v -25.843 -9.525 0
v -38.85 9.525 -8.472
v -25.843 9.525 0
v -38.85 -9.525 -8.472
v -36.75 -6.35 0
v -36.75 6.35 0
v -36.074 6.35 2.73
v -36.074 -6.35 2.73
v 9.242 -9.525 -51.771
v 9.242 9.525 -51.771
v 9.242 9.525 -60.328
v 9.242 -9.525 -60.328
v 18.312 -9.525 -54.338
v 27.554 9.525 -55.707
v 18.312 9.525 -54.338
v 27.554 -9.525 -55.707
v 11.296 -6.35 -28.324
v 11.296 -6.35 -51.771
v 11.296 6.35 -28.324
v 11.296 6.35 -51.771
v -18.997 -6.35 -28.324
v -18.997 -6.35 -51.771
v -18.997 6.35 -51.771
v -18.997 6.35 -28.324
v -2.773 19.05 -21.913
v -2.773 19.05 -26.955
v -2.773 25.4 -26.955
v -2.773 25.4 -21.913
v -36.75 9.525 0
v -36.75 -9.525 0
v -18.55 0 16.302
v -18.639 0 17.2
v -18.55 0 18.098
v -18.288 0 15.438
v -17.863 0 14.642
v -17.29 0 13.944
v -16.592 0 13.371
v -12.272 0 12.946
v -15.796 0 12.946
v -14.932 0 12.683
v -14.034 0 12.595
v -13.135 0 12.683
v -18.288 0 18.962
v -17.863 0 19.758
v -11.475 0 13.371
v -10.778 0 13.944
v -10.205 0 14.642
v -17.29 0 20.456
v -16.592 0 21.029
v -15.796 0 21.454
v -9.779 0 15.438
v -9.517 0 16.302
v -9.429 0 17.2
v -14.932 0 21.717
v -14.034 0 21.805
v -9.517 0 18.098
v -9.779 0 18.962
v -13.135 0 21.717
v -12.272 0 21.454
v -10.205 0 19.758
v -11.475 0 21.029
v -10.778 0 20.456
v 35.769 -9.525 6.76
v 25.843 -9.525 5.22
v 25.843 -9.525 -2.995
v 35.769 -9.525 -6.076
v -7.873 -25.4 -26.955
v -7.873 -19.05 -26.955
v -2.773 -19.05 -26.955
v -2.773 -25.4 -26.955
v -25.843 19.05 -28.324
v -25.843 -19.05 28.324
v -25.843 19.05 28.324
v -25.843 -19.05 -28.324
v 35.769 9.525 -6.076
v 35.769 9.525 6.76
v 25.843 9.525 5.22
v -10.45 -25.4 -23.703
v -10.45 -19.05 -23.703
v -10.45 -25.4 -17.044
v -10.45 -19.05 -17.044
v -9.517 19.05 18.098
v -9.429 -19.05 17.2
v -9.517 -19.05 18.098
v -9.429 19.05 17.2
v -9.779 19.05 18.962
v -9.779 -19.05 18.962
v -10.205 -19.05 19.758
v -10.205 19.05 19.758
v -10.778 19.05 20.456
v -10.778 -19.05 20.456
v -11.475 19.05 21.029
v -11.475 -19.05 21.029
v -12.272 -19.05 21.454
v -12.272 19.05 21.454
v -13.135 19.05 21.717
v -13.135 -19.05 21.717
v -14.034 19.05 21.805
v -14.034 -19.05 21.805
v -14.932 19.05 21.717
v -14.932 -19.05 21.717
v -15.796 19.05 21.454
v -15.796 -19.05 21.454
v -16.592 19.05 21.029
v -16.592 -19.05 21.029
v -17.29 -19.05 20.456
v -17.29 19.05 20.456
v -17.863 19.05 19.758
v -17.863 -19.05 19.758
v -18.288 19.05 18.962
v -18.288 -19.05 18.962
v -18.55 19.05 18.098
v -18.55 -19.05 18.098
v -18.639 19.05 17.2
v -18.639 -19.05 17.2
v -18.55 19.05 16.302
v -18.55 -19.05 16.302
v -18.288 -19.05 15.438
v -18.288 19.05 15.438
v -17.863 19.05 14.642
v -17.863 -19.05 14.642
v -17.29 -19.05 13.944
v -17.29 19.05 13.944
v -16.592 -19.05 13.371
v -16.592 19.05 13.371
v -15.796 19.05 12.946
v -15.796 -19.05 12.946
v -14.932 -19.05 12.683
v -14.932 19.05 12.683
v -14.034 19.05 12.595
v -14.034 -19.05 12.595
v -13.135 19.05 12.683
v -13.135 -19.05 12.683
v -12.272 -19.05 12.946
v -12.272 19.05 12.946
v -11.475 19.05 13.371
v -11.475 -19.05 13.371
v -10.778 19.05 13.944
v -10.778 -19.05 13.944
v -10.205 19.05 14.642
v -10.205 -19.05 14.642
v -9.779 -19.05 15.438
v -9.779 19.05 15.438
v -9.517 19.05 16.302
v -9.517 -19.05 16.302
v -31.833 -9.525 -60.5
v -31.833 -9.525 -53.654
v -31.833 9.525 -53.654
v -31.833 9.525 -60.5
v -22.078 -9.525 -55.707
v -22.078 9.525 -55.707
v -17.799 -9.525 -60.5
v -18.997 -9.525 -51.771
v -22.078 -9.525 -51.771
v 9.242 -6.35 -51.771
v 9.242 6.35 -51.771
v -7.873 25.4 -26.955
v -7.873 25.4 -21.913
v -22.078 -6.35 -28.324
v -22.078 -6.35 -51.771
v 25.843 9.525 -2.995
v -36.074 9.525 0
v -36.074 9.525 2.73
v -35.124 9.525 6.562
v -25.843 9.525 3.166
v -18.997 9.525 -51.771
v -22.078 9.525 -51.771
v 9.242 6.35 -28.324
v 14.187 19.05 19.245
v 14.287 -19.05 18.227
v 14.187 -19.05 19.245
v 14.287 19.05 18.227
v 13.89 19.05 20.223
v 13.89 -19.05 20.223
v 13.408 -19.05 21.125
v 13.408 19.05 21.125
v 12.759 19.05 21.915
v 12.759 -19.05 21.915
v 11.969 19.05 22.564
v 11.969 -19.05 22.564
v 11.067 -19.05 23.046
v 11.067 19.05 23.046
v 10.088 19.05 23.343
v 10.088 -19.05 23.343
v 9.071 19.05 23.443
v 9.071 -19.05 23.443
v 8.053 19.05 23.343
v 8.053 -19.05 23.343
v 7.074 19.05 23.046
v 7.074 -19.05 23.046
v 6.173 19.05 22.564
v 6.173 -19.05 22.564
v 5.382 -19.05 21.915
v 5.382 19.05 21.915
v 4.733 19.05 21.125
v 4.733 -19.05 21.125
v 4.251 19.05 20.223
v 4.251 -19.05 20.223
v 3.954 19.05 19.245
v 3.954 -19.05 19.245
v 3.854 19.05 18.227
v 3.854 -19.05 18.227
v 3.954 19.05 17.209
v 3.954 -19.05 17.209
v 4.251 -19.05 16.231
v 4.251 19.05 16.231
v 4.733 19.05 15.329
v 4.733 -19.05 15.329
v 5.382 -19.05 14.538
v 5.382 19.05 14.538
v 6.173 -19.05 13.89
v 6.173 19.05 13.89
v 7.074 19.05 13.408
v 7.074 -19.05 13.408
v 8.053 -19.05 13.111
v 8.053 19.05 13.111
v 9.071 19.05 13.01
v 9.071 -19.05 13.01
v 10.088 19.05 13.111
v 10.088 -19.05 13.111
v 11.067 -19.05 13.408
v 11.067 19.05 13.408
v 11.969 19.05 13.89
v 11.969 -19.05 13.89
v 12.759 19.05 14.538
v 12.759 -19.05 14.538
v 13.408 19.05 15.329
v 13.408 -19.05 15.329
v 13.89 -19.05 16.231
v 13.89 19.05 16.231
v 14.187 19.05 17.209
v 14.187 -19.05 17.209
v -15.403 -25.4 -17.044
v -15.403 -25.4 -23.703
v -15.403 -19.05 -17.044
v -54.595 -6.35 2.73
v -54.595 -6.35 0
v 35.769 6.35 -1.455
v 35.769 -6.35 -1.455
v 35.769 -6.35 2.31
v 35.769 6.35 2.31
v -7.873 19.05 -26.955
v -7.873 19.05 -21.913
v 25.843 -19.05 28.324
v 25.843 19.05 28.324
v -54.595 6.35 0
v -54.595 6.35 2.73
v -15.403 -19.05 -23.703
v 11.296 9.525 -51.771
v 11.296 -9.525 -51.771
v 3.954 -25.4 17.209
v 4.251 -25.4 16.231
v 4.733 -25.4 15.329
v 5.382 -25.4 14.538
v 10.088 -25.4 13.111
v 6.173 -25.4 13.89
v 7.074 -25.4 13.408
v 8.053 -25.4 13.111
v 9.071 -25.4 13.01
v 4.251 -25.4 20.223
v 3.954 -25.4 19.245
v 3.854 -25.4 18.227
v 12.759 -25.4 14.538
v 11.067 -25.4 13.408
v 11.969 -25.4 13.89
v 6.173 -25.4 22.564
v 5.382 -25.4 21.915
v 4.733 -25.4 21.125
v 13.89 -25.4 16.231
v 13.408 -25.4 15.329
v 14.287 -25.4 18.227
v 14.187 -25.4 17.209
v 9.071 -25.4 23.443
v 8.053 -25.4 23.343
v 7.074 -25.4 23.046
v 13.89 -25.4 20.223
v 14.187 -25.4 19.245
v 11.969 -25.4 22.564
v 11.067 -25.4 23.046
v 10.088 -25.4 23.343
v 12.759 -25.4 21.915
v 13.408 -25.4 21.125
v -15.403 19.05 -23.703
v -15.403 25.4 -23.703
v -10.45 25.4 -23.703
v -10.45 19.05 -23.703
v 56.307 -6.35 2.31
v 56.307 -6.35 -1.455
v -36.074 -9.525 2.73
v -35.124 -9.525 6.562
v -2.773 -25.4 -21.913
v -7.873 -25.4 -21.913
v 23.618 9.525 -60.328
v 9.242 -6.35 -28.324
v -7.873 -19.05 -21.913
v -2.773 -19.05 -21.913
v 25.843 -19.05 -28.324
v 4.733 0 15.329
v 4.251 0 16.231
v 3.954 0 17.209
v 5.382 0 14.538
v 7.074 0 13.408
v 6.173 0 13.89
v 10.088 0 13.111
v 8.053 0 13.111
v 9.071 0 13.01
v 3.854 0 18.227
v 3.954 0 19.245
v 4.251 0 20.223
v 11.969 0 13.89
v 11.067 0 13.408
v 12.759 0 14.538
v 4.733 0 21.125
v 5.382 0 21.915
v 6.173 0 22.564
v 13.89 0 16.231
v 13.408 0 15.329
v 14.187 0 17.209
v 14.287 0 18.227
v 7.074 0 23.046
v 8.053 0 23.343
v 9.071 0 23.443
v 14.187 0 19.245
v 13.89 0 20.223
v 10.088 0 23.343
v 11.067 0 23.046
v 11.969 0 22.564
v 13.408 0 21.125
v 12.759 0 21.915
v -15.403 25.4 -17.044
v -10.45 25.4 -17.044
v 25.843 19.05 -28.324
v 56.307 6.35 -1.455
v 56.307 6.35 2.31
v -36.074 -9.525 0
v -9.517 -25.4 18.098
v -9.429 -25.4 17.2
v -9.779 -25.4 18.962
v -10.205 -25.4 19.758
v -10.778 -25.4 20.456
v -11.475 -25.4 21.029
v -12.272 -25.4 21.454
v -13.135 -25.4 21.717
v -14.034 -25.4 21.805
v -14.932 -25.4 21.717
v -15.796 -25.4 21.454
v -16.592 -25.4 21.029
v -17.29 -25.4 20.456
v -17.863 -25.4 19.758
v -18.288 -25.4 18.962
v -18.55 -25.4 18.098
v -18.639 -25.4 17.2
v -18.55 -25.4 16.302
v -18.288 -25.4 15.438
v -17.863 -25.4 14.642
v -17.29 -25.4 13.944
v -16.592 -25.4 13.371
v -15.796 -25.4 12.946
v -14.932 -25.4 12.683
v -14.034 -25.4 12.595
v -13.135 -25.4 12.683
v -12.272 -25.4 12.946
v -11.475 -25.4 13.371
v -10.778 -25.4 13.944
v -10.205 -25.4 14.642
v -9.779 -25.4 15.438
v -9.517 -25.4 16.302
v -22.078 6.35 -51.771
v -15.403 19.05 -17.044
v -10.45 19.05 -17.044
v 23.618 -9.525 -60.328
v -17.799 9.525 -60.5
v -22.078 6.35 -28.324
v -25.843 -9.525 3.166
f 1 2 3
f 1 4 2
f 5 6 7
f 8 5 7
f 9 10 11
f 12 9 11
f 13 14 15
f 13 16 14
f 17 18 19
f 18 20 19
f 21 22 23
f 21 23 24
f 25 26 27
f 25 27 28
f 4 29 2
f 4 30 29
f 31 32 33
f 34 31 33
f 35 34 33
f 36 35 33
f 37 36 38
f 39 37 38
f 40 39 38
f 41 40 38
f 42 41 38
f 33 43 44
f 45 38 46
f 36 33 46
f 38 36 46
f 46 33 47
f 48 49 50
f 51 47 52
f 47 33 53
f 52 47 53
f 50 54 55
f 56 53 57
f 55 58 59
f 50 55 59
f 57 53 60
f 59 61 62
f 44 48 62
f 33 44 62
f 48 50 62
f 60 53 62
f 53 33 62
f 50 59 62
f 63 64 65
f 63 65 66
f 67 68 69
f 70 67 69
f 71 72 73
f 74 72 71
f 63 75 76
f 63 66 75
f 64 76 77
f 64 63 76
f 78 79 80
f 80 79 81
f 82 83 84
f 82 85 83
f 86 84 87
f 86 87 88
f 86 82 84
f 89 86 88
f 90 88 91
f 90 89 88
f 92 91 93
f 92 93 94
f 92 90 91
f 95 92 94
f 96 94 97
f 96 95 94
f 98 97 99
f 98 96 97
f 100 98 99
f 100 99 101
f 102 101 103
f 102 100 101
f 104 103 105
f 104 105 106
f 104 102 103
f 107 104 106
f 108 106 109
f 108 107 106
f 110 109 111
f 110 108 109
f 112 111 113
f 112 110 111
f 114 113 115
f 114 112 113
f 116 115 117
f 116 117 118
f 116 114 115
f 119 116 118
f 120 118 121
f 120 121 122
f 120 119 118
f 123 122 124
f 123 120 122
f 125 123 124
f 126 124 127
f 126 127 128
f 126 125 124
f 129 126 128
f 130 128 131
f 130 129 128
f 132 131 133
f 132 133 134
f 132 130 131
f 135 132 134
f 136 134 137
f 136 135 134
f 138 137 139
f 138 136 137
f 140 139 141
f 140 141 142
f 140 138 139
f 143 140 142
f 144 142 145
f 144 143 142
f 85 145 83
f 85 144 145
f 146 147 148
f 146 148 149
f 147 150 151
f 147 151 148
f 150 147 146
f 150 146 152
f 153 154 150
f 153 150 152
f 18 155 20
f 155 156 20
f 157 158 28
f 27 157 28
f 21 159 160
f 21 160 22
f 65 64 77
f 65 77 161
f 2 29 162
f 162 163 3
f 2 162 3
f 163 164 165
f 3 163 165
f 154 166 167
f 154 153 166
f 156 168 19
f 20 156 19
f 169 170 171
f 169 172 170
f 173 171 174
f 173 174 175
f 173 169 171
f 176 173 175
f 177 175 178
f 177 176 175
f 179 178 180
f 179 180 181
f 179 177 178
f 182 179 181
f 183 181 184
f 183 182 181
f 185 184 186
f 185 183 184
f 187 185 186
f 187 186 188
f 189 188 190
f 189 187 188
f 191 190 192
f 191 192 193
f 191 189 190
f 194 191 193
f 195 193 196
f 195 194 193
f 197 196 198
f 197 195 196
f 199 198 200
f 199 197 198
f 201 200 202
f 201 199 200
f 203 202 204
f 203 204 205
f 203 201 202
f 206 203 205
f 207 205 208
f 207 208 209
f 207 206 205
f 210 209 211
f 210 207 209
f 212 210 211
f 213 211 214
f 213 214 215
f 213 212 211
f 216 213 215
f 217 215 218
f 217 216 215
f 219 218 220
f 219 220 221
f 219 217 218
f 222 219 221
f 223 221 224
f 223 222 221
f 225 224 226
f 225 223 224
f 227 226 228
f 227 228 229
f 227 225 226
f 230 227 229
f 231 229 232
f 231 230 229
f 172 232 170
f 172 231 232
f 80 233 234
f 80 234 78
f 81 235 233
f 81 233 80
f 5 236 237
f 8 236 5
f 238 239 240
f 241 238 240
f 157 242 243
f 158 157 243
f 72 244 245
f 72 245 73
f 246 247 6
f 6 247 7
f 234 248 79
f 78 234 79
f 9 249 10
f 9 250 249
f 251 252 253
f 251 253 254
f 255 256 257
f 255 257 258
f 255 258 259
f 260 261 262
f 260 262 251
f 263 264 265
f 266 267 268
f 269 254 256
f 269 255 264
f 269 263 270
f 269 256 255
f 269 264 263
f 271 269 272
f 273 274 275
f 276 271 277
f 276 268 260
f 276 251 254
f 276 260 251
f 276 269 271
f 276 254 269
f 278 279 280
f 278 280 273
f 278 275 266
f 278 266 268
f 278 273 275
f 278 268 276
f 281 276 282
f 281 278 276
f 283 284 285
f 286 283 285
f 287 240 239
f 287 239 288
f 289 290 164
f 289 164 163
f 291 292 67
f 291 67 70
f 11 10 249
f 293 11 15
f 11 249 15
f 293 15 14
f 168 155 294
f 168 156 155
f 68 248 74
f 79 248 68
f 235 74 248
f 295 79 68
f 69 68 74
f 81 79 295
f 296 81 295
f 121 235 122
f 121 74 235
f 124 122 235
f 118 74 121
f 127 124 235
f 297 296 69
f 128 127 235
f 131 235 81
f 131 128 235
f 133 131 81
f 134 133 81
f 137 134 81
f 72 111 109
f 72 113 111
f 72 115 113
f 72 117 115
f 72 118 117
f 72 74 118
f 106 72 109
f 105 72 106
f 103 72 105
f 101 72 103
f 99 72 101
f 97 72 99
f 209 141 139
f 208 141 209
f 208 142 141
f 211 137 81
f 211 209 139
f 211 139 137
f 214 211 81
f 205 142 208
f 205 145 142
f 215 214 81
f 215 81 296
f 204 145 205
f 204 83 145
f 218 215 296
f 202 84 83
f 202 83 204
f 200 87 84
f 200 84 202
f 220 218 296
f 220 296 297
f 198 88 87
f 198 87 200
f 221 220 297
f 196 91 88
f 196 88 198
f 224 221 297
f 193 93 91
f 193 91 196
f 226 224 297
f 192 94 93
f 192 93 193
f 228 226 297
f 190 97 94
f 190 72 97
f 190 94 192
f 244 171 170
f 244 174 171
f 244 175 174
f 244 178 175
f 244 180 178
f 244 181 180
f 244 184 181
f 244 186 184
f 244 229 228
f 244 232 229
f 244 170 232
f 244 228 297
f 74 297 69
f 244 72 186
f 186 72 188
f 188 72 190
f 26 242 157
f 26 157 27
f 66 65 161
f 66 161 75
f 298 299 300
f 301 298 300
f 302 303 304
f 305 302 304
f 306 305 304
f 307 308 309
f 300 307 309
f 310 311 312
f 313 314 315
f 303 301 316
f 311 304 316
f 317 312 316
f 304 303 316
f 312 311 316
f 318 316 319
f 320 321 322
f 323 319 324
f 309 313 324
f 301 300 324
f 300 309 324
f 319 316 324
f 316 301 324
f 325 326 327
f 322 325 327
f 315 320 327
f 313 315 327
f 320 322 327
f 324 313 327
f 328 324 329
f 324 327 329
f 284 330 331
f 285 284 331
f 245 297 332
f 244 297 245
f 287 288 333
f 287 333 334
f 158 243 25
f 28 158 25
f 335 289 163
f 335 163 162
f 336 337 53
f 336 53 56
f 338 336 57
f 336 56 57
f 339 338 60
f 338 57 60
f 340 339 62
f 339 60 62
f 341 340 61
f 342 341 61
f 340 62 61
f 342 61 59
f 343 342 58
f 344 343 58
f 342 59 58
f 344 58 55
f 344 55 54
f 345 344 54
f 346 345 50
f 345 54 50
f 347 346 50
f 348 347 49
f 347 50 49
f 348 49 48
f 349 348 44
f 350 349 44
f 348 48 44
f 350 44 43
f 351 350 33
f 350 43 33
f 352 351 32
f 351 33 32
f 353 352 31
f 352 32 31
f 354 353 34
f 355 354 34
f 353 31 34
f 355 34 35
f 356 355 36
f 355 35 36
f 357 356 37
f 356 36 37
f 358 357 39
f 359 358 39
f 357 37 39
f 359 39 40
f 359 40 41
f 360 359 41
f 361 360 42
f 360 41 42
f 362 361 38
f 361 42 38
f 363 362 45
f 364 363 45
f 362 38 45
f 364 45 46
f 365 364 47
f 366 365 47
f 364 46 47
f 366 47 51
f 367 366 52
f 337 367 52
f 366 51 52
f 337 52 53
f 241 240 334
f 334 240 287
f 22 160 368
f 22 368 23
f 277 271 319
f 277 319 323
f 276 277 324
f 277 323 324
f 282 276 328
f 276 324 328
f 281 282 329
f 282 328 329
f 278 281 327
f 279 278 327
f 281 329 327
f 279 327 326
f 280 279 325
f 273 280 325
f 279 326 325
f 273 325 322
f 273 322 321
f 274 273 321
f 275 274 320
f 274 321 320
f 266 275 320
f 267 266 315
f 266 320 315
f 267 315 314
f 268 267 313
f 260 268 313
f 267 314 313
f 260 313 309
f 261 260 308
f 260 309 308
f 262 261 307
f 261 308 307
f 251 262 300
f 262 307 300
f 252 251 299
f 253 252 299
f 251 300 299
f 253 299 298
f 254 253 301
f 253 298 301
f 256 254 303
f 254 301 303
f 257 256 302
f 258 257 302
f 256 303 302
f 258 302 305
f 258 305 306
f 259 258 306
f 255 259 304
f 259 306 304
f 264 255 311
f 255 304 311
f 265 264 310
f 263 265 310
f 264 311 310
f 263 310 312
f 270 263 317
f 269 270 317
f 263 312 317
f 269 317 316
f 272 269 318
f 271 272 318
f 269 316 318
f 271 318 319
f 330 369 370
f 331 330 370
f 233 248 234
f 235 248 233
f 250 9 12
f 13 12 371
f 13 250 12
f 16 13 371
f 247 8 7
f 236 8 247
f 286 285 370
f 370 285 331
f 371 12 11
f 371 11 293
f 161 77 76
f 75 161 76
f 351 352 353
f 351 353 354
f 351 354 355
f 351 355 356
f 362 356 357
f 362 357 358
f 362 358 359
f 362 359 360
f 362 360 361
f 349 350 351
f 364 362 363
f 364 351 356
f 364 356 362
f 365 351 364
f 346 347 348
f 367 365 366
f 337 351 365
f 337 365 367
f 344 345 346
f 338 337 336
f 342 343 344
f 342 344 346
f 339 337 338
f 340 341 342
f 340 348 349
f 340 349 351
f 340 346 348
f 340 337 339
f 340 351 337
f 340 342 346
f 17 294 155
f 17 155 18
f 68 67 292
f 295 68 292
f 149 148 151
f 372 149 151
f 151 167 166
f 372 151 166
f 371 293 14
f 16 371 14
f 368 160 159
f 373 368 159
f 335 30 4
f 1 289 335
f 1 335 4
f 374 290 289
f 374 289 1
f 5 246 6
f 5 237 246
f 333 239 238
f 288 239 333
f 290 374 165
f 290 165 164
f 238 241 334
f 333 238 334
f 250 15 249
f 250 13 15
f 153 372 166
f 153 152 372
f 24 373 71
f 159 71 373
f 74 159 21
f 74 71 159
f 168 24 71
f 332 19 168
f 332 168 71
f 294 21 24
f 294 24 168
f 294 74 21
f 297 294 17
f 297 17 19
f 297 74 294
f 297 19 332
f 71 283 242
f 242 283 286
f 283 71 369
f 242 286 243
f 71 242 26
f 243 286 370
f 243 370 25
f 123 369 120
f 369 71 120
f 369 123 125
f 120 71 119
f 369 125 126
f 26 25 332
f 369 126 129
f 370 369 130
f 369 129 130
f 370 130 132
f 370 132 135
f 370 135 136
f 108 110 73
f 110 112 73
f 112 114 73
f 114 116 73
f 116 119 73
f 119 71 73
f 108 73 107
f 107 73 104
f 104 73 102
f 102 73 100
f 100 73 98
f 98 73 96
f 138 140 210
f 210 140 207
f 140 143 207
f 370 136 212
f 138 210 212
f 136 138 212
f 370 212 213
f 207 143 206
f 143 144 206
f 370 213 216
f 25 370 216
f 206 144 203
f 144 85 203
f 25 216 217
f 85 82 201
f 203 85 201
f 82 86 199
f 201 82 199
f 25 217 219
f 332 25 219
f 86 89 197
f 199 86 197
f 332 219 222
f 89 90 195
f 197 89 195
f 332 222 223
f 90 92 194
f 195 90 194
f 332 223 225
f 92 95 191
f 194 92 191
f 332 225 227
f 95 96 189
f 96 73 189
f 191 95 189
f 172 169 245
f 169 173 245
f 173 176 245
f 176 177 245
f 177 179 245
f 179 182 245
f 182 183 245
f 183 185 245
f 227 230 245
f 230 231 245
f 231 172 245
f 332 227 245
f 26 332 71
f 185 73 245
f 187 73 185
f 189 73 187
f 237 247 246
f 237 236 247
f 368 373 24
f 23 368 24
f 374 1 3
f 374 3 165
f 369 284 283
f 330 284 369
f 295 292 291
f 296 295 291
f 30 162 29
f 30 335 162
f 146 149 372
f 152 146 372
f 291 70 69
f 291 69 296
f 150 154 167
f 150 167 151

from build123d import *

# Parameters (mm, degrees)
F0_R     = 4.6050240083
F1_DEPTH = 25.4
F0_R_2   = 5.2163960765
F0_W     = 5.0996192879
F0_H     = 5.0427047919
F0_W_2   = 4.9532863107
F0_H_2   = 6.6598858346
F2_DEPTH = 19.05
F0_W_3   = 20.5373242497
F0_H_3   = 3.765176516
F3_DEPTH = 6.35
F0_W_4   = 2.0537329838
F0_H_4   = 23.4467815608
F0_W_5   = 3.08059901
F4_DEPTH = 9.525
F6_DEPTH = 25.4


# Not quite as in the source:
# - the program builds the solid bodies; features that only make, move or delete a surface that nothing else refers to are left out


with BuildPart() as f1:
    # F0 (on Front) → F1 (new body)
    with BuildSketch(Plane.XZ):
        with Locations((-14.0338391066, 17.2000098974)):
            Circle(F0_R)
    extrude(amount=F1_DEPTH)


with BuildPart() as f1b:
    # F0 (on Front) → F1, piece 2 (new body)
    with BuildSketch(Plane.XZ):
        with Locations((9.070652537, 18.2268768549)):
            Circle(F0_R_2)
    extrude(amount=F1_DEPTH)


with BuildPart() as f2:
    # F0 (on Front) → F2 (new body, symmetric)
    with BuildSketch(Plane.XZ):
        Polygon((-25.8428025991, 0), (-25.8428025991, -28.3243972808), (-22.0776256174, -28.3243972808), (-18.9970266074, -28.3243972808), (9.24179703, -28.3243972808), (11.2955300137, -28.3243972808), (25.8428025991, -28.3243972808), (25.8428025991, -2.9950267635), (25.8428025991, 5.2199037746), (25.8428025991, 28.3243972808), (-25.8428025991, 28.3243972808), (-25.8428025991, 3.1661712565), align=None)
        with Locations((-5.3228323739, -24.4338870788)):
            Rectangle(F0_W, F0_H, mode=Mode.SUBTRACT)
        with Locations((-12.9263509633, -20.3735558485)):
            Rectangle(F0_W_2, F0_H_2, mode=Mode.SUBTRACT)
        with Locations((-14.0338391066, 17.2000098974)):
            Circle(F0_R, mode=Mode.SUBTRACT)
        with Locations((9.070652537, 18.2268768549)):
            Circle(F0_R_2, mode=Mode.SUBTRACT)
    extrude(amount=F2_DEPTH, both=True)

    # F0 (on Front) → F3, piece 2 (join, symmetric)
    with BuildSketch(Plane.XZ):
        with Locations((10.2686635219, -40.0477880612)):
            Rectangle(F0_W_4, F0_H_4)
        with Locations((-20.5373261124, -40.0477880612)):
            Rectangle(F0_W_5, F0_H_4)
    extrude(amount=F3_DEPTH, both=True)

    # F0 (on Front) → F6 (join, symmetric)
    with BuildSketch(Plane.XZ):
        with Locations((-12.9263509633, -20.3735558485)):
            Rectangle(F0_W_2, F0_H_2)
        with Locations((-5.3228323739, -24.4338870788)):
            Rectangle(F0_W, F0_H)
    extrude(amount=F6_DEPTH, both=True)


with BuildPart() as f3:
    # F0 (on Front) → F3 (new body, symmetric)
    with BuildSketch(Plane.XZ):
        with Locations((46.0378415883, 0.4278609995)):
            Rectangle(F0_W_3, F0_H_3)
    extrude(amount=F3_DEPTH, both=True)


with BuildPart() as f3b:
    # F0 (on Front) → F3, piece 3 (new body, symmetric)
    with BuildSketch(Plane.XZ):
        Polygon((-54.5950606465, 0), (-36.7501180492, 0), (-36.0735851604, 2.7296595719), (-54.5950606465, 2.7296595719), align=None)
    extrude(amount=F3_DEPTH, both=True)


with BuildPart() as f4:
    # F0 (on Front) → F4 (new body, symmetric)
    with BuildSketch(Plane.XZ):
        Polygon((35.7691794634, 6.7602032796), (25.8428025991, 5.2199037746), (25.8428025991, -2.9950267635), (35.7691794634, -6.0756253079), (35.7691794634, -1.4547272585), (35.7691794634, 2.3104492575), align=None)
    extrude(amount=F4_DEPTH, both=True)


with BuildPart() as f4b:
    # F0 (on Front) → F4, piece 2 (new body, symmetric)
    with BuildSketch(Plane.XZ):
        Polygon((11.2955300137, -51.7711788416), (9.24179703, -51.7711788416), (9.24179703, -60.3283941746), (23.617926985, -60.3283941746), (27.5542456657, -55.7074993849), (18.3124504983, -54.3383434415), align=None)
    extrude(amount=F4_DEPTH, both=True)


with BuildPart() as f4c:
    # F0 (on Front) → F4, piece 3 (new body, symmetric)
    with BuildSketch(Plane.XZ):
        Polygon((-18.9970266074, -51.7711788416), (-22.0776256174, -51.7711788416), (-22.0776256174, -55.7074993849), (-31.8328551948, -53.6537654698), (-31.8328551948, -60.4995377362), (-17.7990160882, -60.4995377362), align=None)
    extrude(amount=F4_DEPTH, both=True)


with BuildPart() as f4d:
    # F0 (on Front) → F4, piece 4 (new body, symmetric)
    with BuildSketch(Plane.XZ):
        Polygon((-38.8497747481, -8.4716472775), (-25.8428025991, 0), (-25.8428025991, 3.1661712565), (-35.1238397671, 6.5616707666), (-36.0735851604, 2.7296595719), (-36.0735851604, 0), (-36.7501180492, 0), align=None)
    extrude(amount=F4_DEPTH, both=True)


solid = Compound([f1.part, f1b.part, f2.part, f3.part, f3b.part, f4.part, f4b.part, f4c.part, f4d.part])
